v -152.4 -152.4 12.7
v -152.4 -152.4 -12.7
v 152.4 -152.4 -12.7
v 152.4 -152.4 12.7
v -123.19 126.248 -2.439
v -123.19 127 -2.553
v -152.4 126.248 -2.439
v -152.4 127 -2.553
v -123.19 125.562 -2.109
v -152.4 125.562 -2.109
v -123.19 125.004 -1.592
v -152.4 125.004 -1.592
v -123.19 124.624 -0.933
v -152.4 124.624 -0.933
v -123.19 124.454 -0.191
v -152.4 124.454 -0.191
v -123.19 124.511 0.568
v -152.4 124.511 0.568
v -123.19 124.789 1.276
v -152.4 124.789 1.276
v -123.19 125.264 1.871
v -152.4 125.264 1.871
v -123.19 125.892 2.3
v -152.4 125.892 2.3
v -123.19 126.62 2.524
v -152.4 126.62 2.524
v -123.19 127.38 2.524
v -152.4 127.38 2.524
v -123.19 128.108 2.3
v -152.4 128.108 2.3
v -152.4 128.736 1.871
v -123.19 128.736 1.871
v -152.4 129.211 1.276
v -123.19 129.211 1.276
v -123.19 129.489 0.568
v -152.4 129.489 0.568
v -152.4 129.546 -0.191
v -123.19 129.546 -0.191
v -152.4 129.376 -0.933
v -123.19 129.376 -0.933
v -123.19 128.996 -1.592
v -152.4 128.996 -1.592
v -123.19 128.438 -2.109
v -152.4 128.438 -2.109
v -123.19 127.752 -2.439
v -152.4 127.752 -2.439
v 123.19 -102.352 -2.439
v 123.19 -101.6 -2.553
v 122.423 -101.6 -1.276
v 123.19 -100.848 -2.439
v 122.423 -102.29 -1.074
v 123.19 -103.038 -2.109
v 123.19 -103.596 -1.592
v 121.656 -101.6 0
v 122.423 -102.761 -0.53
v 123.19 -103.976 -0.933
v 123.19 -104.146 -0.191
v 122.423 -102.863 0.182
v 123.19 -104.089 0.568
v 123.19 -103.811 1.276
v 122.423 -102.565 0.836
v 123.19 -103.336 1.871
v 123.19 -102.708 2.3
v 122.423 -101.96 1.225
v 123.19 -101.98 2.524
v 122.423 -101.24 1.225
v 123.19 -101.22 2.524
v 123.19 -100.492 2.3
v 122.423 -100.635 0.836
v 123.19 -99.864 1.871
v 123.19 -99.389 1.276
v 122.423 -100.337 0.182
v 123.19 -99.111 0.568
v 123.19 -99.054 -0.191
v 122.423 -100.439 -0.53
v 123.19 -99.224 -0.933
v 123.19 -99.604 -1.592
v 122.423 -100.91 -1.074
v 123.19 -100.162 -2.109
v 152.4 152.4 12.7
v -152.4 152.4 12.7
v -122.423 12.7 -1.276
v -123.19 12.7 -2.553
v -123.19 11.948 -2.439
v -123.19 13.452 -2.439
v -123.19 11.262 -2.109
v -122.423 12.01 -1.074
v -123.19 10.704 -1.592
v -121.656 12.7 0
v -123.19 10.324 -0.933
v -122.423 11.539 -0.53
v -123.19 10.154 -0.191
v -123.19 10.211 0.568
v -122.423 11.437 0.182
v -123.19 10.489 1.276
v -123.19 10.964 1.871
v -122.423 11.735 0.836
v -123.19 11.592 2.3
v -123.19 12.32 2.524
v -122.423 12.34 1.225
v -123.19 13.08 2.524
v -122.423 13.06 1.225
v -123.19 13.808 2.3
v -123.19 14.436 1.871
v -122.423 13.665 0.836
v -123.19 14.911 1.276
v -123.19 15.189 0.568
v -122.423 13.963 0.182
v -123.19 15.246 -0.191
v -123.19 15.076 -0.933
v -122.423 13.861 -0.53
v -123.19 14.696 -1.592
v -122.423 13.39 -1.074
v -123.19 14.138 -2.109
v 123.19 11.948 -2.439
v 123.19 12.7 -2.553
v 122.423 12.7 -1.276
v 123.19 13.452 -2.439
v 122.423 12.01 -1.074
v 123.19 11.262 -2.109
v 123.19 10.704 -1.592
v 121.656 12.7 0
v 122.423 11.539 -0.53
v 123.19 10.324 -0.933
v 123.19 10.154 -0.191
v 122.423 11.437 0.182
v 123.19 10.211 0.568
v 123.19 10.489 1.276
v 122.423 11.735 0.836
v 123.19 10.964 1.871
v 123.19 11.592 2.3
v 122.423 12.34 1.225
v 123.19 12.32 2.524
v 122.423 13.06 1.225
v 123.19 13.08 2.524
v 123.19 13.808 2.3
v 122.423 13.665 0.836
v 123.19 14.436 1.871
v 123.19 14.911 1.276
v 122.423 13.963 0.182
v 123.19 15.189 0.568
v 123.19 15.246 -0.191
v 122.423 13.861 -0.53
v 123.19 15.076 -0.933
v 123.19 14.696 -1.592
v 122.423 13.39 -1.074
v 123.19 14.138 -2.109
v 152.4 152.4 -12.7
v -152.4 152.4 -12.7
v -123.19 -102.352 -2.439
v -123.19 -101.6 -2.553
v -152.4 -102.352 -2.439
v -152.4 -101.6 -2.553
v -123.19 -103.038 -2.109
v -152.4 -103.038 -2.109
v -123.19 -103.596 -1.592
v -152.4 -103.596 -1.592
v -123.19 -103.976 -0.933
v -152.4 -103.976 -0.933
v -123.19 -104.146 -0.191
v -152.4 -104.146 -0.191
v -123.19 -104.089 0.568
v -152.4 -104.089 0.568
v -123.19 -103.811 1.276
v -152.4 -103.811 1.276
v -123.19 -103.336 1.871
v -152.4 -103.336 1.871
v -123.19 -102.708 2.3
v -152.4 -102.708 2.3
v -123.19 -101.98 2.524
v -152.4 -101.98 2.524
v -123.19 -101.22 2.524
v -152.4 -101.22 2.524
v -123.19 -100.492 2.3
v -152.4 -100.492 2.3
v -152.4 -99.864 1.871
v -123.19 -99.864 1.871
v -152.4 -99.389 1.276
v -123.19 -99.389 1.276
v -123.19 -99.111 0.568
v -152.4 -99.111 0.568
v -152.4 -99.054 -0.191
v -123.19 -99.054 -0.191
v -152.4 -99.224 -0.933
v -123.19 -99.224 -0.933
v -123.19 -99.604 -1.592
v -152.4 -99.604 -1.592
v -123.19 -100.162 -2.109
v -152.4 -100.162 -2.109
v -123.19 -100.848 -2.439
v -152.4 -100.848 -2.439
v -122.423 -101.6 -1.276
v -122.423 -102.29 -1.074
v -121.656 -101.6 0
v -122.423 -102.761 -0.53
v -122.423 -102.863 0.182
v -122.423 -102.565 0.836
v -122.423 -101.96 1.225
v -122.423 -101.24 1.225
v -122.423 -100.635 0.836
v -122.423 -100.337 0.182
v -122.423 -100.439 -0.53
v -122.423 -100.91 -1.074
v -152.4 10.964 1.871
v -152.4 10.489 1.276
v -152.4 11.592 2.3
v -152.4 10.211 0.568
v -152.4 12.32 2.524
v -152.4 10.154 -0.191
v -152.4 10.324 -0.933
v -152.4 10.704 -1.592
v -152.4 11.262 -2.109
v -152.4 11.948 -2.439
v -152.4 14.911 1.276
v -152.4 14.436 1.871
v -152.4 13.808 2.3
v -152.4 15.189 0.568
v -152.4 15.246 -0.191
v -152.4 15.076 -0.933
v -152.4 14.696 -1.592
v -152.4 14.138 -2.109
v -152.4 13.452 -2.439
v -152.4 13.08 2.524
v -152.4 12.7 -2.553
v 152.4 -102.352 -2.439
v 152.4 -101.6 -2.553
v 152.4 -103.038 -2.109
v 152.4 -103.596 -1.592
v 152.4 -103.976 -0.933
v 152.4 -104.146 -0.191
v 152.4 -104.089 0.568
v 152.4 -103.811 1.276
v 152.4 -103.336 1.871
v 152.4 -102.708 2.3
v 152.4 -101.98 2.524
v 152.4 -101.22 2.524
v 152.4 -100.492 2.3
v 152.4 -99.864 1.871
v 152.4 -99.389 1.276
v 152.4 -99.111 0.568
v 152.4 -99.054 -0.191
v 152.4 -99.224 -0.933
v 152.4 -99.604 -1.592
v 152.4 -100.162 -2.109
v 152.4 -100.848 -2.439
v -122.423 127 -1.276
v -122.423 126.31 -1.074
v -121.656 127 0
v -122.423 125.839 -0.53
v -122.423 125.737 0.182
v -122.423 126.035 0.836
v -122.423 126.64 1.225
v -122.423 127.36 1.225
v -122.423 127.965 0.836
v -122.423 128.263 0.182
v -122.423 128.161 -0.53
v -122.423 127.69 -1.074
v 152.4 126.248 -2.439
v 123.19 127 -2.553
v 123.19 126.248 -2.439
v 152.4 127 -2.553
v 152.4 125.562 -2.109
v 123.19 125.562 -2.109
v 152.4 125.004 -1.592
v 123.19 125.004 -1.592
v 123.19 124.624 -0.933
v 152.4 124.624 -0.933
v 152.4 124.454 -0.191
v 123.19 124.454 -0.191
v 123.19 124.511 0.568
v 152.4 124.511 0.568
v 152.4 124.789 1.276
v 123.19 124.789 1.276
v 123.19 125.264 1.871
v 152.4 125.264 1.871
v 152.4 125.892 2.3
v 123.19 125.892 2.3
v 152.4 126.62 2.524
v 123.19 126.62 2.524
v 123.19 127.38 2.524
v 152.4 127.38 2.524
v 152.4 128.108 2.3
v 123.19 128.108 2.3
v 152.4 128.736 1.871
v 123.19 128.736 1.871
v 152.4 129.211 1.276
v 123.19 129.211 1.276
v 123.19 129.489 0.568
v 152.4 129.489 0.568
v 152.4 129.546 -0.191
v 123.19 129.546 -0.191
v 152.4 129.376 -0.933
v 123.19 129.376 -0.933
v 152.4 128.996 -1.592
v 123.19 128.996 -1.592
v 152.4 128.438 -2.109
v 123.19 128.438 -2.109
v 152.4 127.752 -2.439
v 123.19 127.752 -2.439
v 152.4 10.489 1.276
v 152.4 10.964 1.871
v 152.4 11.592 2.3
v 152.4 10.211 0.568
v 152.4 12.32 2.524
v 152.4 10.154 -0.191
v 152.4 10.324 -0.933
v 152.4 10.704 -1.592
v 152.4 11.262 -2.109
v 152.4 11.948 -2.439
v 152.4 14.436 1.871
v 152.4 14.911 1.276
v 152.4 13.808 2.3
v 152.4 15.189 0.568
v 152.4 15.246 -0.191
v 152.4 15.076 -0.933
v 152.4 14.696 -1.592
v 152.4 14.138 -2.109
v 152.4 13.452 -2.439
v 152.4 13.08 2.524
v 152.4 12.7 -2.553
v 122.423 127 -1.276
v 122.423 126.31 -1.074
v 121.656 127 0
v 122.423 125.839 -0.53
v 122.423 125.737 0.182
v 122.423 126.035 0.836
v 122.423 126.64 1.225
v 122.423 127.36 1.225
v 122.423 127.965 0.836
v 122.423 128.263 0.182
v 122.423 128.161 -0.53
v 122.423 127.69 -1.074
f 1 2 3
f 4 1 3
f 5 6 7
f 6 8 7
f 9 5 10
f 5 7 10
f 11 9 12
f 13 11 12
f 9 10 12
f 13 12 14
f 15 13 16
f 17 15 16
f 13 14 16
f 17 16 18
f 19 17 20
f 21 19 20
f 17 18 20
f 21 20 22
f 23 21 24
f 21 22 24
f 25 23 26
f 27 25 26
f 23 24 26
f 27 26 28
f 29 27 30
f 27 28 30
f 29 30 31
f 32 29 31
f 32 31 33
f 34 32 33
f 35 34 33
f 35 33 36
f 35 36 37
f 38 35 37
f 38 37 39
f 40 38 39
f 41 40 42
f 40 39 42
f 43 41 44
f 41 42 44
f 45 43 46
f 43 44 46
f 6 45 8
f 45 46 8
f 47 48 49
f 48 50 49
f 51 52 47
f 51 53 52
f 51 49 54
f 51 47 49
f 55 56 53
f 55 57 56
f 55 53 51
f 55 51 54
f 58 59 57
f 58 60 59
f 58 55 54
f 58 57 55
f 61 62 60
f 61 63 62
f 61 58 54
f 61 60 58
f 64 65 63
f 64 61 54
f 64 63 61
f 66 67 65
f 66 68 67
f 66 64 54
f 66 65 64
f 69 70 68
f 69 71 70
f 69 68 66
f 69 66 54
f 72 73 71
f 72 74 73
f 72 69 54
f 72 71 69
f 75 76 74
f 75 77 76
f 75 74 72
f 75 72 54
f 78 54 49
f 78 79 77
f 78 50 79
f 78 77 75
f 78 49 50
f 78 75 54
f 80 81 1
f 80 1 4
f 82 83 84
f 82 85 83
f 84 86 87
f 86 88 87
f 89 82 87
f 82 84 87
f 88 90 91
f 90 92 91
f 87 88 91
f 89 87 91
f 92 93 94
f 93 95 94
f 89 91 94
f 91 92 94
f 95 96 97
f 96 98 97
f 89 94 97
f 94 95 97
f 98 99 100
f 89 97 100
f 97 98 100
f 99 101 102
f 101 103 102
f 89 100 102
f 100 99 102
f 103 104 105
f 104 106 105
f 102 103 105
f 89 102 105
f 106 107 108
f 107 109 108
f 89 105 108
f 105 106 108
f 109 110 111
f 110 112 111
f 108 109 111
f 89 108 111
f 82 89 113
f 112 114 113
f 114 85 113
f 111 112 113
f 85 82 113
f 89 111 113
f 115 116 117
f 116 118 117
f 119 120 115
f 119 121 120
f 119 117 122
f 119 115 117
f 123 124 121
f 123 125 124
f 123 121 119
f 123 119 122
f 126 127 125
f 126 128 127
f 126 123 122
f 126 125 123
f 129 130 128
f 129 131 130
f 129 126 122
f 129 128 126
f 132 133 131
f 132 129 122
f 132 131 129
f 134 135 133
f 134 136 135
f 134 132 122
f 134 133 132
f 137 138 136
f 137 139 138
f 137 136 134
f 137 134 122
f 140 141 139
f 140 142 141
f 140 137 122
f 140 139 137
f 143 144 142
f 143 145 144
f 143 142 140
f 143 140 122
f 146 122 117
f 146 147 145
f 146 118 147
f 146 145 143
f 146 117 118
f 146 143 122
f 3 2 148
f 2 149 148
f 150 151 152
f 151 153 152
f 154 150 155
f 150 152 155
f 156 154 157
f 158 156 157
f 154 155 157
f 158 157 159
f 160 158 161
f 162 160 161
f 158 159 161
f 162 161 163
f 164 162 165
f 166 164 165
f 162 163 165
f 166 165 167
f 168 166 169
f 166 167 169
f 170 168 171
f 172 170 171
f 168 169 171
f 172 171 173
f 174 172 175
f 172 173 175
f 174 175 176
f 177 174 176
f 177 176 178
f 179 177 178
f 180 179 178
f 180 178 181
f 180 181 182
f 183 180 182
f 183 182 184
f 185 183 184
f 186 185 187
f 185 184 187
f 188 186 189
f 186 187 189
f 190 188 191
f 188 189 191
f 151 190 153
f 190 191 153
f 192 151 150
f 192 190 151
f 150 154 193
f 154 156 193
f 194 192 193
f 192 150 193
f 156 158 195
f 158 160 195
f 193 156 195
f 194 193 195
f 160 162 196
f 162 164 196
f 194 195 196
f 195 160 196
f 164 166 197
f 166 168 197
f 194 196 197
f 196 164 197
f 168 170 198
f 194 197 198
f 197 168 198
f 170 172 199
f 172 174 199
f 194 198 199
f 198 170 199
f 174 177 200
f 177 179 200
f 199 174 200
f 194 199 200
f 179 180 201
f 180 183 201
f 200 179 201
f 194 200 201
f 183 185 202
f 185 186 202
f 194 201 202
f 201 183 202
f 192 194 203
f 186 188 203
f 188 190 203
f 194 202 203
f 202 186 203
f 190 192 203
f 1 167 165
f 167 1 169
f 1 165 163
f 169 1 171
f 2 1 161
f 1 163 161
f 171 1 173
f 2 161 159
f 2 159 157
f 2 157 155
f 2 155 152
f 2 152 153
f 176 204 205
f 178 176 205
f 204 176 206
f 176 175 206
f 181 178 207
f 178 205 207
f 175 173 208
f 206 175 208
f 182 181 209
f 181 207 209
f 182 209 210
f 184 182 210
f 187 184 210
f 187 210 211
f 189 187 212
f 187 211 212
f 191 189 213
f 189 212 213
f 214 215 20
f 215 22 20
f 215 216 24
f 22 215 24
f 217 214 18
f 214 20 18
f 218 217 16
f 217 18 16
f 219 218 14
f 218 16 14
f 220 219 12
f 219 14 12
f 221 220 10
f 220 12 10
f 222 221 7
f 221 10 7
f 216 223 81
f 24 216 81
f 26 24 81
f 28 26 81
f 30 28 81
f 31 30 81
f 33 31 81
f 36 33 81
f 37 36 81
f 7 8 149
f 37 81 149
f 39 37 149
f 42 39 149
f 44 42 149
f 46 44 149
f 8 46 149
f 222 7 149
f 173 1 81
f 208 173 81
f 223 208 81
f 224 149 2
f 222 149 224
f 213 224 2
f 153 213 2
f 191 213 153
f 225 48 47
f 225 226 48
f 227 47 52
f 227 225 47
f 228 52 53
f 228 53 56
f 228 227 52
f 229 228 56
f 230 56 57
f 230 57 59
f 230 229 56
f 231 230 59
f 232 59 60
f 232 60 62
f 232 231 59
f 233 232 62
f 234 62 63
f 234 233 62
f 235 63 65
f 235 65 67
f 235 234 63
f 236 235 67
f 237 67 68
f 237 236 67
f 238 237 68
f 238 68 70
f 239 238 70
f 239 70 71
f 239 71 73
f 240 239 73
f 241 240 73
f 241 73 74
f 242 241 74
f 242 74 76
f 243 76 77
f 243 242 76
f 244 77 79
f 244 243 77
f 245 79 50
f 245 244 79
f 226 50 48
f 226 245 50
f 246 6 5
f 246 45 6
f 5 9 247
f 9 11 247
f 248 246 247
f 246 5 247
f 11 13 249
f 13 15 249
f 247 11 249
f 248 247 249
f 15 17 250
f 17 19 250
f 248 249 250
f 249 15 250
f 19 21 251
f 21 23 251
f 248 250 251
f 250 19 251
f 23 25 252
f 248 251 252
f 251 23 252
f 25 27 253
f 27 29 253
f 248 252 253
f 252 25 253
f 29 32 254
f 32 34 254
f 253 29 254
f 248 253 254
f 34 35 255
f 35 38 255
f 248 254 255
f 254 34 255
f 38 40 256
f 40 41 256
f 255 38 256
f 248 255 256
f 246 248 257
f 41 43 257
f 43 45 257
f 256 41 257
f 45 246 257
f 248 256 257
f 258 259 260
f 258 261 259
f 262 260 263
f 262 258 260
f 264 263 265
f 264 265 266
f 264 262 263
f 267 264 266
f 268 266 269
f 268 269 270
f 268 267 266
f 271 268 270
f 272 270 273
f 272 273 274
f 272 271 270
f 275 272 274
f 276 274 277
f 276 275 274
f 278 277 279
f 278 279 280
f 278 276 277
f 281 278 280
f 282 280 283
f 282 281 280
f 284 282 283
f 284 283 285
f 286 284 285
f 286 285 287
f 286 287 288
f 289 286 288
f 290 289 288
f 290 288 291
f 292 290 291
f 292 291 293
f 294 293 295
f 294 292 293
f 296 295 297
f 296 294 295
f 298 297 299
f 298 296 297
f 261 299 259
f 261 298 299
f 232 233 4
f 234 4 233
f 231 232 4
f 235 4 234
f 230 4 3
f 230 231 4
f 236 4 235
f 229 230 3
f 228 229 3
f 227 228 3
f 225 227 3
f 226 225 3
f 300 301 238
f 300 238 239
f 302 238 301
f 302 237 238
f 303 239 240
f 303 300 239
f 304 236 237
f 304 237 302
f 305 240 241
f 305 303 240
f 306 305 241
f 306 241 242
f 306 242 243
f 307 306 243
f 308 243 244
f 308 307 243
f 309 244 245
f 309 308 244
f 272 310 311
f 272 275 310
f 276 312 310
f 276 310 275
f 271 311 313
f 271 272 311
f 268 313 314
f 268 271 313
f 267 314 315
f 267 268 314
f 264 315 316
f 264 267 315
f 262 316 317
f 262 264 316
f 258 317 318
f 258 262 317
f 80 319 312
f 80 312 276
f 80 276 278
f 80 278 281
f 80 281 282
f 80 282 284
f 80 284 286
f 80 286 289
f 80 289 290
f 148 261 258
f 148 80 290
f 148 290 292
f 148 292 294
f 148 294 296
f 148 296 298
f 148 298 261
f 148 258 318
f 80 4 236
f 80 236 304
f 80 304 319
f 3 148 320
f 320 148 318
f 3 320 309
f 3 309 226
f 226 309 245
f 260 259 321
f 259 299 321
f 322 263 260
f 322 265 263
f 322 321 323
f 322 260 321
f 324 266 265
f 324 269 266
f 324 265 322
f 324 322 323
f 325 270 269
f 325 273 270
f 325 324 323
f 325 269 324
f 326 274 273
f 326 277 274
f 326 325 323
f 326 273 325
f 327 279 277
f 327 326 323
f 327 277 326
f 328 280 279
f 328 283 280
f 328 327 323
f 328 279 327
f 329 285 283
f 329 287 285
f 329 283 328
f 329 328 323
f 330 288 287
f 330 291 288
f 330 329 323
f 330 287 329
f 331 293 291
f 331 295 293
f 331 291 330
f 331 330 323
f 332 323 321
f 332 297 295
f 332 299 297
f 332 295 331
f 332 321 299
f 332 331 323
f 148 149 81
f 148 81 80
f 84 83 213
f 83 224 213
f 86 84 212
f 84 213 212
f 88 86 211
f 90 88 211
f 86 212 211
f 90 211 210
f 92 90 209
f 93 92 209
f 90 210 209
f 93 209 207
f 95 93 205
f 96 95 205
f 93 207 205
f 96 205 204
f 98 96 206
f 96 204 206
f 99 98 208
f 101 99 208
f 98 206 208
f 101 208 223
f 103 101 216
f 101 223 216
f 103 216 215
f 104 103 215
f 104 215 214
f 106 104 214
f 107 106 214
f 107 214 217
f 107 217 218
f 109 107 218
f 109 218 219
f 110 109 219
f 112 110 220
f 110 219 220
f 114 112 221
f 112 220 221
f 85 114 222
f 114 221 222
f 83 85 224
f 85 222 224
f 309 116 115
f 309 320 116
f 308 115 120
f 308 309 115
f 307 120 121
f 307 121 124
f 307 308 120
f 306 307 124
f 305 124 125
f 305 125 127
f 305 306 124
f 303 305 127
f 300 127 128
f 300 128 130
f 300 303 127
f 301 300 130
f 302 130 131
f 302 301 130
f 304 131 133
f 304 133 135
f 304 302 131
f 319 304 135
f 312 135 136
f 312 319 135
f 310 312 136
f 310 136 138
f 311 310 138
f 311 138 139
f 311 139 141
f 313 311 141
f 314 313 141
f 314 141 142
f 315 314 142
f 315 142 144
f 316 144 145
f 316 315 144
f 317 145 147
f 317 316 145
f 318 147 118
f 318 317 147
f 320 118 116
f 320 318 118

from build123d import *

# Parameters (mm, degrees)
SKETCH1_W                        = 304.8
SKETCH1_H                        = 25.4
BOSS_EXTRUDE1_DEPTH              = 152.4
F_1_4_20_TAPPED_HOLE1_AT_2_COUNT = 2
F_1_4_20_TAPPED_HOLE1_AT_2_PITCH = 114.3
F_1_4_20_TAPPED_HOLE1_AT_3_COUNT = 2
F_1_4_20_TAPPED_HOLE1_AT_3_PITCH = 228.6


with BuildPart() as part:
    # Sketch1 → Boss-Extrude1 (new, symmetric)
    with BuildSketch(Plane(origin=(0, 0, 0), x_dir=(1, 0, 0), z_dir=(0, 1, 0))):
        Rectangle(SKETCH1_W, SKETCH1_H)
    extrude(amount=BOSS_EXTRUDE1_DEPTH, both=True)

    # Sketch5 → 1/4-20 Tapped Hole1 (revolve, cut)
    with BuildSketch(Plane(origin=(152.4, 127, 0), x_dir=(0, 0, -1), z_dir=(0, 1, 0))):
        Polygon((0, 0), (0, 30.743816902), (2.5527, 29.21), (2.5527, 0), align=None)
    f_1_4_20_tapped_hole1 = revolve(axis=Axis((158.75, 127, 0), (-1, 0, 0)), mode=Mode.SUBTRACT)

    # 1/4-20 Tapped Hole1 at 2: 1/4-20 Tapped Hole1 ×2
    with Locations(*[(0, -i * F_1_4_20_TAPPED_HOLE1_AT_2_PITCH, 0) for i in range(1, F_1_4_20_TAPPED_HOLE1_AT_2_COUNT)]):
        add(f_1_4_20_tapped_hole1, mode=Mode.SUBTRACT)

    # 1/4-20 Tapped Hole1 at 3: 1/4-20 Tapped Hole1 ×2
    with Locations(*[(0, -i * F_1_4_20_TAPPED_HOLE1_AT_3_PITCH, 0) for i in range(1, F_1_4_20_TAPPED_HOLE1_AT_3_COUNT)]):
        add(f_1_4_20_tapped_hole1, mode=Mode.SUBTRACT)

    # Mirror1: 1/4-20 Tapped Hole1 across plane
    add(f_1_4_20_tapped_hole1.mirror(Plane(origin=(0, 0, 0), x_dir=(0, 0, 1), z_dir=(1, 0, 0))), mode=Mode.SUBTRACT)

    # Mirror1 copy 1 sketch → Mirror1 copy 1 (revolve, cut)
    with BuildSketch(Plane(origin=(-152.4, 12.7, 0), x_dir=(0, 0, -1), z_dir=(0, 1, 0))):
        Polygon((0, 0), (0, -30.743816902), (2.5527, -29.21), (2.5527, 0), align=None)
    revolve(axis=Axis((-158.75, 12.7, 0), (-1, 0, 0)), mode=Mode.SUBTRACT)

    # Mirror1 copy 2 sketch → Mirror1 copy 2 (revolve, cut)
    with BuildSketch(Plane(origin=(-152.4, -101.6, 0), x_dir=(0, 0, -1), z_dir=(0, 1, 0))):
        Polygon((0, 0), (0, -30.743816902), (2.5527, -29.21), (2.5527, 0), align=None)
    revolve(axis=Axis((-158.75, -101.6, 0), (-1, 0, 0)), mode=Mode.SUBTRACT)


solid = part.part
